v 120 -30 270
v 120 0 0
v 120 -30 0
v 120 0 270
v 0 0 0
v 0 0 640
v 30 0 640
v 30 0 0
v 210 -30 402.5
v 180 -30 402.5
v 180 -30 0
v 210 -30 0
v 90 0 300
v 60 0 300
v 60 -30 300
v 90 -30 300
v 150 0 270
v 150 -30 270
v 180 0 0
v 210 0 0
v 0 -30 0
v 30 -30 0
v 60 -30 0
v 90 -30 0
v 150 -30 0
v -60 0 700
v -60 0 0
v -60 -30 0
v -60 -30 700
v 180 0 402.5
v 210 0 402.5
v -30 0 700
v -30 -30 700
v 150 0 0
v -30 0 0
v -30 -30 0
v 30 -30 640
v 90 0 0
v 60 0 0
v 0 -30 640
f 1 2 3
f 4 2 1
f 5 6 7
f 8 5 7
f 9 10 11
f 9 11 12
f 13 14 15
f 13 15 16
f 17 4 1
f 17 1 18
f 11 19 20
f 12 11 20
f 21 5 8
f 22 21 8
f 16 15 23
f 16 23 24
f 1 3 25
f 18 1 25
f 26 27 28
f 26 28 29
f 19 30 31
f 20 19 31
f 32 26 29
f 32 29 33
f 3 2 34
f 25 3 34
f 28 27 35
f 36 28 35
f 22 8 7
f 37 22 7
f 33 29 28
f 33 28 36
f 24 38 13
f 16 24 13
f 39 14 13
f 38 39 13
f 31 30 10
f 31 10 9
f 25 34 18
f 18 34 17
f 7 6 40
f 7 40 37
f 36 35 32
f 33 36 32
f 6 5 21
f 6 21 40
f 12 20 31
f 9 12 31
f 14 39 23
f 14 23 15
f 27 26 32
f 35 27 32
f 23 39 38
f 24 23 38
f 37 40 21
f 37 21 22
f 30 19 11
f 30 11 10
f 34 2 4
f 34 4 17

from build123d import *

# Parameters (mm, degrees)
F0_W     = 30
F0_H     = 700
F0_H_2   = 640
F0_H_3   = 300
F0_H_4   = 270
F0_H_5   = 402.5
F1_DEPTH = 30


with BuildPart() as f1:
    # F0 (on Front) → F1 (new body)
    with BuildSketch(Plane.XZ):
        with Locations((-45, 350)):
            Rectangle(F0_W, F0_H)
        with Locations((15, 320)):
            Rectangle(F0_W, F0_H_2)
        with Locations((75, 150)):
            Rectangle(F0_W, F0_H_3)
        with Locations((135, 135)):
            Rectangle(F0_W, F0_H_4)
        with Locations((195, 201.25)):
            Rectangle(F0_W, F0_H_5)
    extrude(amount=F1_DEPTH)


solid = f1.part
